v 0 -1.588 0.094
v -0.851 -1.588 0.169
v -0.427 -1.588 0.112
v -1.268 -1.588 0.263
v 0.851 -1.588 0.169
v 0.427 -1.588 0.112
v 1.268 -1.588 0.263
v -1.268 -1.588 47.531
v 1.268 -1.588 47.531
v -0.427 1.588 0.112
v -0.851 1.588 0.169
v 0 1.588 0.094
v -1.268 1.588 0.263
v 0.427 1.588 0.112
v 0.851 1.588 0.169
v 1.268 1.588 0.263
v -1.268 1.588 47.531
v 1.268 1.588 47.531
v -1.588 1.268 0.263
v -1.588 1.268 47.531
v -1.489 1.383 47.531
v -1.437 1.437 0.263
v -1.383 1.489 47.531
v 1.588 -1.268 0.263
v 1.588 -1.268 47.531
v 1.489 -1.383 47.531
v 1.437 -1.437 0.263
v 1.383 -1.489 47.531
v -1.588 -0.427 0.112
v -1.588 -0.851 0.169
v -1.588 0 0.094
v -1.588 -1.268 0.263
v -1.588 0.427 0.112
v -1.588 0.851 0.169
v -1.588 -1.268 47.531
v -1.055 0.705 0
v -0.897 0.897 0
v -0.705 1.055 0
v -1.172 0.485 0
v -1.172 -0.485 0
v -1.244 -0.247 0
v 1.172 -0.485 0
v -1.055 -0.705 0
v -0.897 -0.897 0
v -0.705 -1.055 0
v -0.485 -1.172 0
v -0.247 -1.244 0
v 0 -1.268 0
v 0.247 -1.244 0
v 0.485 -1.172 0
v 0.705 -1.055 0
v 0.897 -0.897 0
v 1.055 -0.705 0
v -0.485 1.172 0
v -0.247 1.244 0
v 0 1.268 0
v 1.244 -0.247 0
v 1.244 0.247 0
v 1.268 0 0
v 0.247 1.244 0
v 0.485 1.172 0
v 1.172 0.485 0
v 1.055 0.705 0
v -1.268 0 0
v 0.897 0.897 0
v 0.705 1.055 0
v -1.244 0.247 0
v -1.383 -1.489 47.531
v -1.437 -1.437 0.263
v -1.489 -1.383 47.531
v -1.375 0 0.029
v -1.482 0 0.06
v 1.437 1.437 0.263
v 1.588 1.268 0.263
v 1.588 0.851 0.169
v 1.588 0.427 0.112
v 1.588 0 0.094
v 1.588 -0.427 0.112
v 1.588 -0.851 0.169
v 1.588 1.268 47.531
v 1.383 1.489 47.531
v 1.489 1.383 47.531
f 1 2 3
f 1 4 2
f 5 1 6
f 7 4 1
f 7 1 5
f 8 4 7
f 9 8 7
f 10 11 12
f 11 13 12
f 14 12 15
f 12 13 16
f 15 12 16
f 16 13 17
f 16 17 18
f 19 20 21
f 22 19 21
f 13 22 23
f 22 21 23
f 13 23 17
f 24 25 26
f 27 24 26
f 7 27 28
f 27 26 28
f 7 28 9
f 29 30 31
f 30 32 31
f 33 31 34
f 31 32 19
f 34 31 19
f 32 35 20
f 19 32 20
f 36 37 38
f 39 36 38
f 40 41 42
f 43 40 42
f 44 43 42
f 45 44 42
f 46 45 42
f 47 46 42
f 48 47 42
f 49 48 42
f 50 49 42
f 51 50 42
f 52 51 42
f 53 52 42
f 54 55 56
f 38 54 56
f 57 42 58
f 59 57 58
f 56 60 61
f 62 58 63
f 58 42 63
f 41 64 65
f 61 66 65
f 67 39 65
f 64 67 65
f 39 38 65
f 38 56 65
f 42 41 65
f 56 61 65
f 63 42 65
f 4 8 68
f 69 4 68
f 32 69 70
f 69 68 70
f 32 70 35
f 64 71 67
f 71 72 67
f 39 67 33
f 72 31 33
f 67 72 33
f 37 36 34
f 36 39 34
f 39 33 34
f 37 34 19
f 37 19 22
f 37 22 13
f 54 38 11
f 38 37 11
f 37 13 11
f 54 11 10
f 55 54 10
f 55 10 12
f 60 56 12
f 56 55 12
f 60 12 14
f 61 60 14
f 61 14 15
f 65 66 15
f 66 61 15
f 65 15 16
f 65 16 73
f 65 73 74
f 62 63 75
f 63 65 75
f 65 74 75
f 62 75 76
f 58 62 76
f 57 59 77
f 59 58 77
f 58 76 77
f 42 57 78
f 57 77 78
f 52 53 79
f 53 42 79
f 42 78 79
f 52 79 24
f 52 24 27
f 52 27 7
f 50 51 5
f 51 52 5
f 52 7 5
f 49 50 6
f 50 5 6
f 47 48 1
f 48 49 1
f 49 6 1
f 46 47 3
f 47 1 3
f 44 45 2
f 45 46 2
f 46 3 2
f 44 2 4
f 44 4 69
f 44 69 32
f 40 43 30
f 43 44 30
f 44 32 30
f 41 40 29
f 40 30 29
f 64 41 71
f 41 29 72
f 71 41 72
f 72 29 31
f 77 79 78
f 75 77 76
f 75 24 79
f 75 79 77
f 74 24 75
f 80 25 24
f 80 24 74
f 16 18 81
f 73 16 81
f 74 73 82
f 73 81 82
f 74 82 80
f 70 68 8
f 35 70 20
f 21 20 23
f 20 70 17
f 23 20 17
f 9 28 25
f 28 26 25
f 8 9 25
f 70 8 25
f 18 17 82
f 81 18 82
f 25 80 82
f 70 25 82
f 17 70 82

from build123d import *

# Parameters (mm, degrees)
SKETCH1_W           = 3.175
SKETCH1_H           = 3.175
BOSS_EXTRUDE1_DEPTH = 25.4
SKETCH2_OUTSIDE_W   = 10.334
SKETCH2_OUTSIDE_H   = 10.334
SKETCH2_OUTSIDE_R   = 2.032
CUT_EXTRUDE1_DEPTH  = 26.4
CUT_EXTRUDE3_DEPTH  = 4.175


with BuildPart() as part:
    # Sketch1 → Boss-Extrude1 (new body)
    with BuildSketch(Plane.XY):
        Rectangle(SKETCH1_W, SKETCH1_H)
    extrude(amount=BOSS_EXTRUDE1_DEPTH)

    # Sketch2 outside → Cut-Extrude1 (cut, through all)
    with BuildSketch(Plane(origin=(0, 0, 0), x_dir=(-1, 0, 0), z_dir=(0, 0, -1))):
        Rectangle(SKETCH2_OUTSIDE_W, SKETCH2_OUTSIDE_H)
        Circle(SKETCH2_OUTSIDE_R, mode=Mode.SUBTRACT)
    extrude(amount=-CUT_EXTRUDE1_DEPTH, mode=Mode.SUBTRACT)

    # Sketch3 → Cut-Revolve1 (revolve, cut)
    with BuildSketch(Plane(origin=(0, 0, 0), x_dir=(1, 0, 0), z_dir=(0, 1, 0))):
        with BuildLine():
            Line((-5.053685963, -4.40273269), (-5.053685963, 5.740530545))
            Line((-5.053685963, 5.740530545), (0, 5.740530545))
            Line((0, 5.740530545), (0, 0.160877736))
            ThreePointArc((0, 0.160877736), (-3.404639553, -1.148866368), (-5.053685963, -4.40273269))
        make_face()
    revolve(axis=Axis((0, 0, 25.4), (0, 0, -1)), mode=Mode.SUBTRACT)

    # Mirror1: part across plane


with BuildPart() as part_1:
    add(part.part)
    add(part.part.mirror(Plane(origin=(0, 0, 25.4), x_dir=(1, 0, 0), z_dir=(0, 0, -1))))

    # Sketch5 → Cut-Extrude3 (cut, through all)
    with BuildSketch(Plane(origin=(1.5875, 0, 0), x_dir=(0, 0, -1), z_dir=(1, 0, 0))):
        Polygon((-50.706459955, -1.5875), (-47.531459955, -1.5875), (-47.531459955, 1.5875), (-50.706459955, 1.5875), (-51.039784271, 1.5875), (-51.039784271, -1.5875), align=None)
    extrude(amount=-CUT_EXTRUDE3_DEPTH, mode=Mode.SUBTRACT)


solid = part_1.part
